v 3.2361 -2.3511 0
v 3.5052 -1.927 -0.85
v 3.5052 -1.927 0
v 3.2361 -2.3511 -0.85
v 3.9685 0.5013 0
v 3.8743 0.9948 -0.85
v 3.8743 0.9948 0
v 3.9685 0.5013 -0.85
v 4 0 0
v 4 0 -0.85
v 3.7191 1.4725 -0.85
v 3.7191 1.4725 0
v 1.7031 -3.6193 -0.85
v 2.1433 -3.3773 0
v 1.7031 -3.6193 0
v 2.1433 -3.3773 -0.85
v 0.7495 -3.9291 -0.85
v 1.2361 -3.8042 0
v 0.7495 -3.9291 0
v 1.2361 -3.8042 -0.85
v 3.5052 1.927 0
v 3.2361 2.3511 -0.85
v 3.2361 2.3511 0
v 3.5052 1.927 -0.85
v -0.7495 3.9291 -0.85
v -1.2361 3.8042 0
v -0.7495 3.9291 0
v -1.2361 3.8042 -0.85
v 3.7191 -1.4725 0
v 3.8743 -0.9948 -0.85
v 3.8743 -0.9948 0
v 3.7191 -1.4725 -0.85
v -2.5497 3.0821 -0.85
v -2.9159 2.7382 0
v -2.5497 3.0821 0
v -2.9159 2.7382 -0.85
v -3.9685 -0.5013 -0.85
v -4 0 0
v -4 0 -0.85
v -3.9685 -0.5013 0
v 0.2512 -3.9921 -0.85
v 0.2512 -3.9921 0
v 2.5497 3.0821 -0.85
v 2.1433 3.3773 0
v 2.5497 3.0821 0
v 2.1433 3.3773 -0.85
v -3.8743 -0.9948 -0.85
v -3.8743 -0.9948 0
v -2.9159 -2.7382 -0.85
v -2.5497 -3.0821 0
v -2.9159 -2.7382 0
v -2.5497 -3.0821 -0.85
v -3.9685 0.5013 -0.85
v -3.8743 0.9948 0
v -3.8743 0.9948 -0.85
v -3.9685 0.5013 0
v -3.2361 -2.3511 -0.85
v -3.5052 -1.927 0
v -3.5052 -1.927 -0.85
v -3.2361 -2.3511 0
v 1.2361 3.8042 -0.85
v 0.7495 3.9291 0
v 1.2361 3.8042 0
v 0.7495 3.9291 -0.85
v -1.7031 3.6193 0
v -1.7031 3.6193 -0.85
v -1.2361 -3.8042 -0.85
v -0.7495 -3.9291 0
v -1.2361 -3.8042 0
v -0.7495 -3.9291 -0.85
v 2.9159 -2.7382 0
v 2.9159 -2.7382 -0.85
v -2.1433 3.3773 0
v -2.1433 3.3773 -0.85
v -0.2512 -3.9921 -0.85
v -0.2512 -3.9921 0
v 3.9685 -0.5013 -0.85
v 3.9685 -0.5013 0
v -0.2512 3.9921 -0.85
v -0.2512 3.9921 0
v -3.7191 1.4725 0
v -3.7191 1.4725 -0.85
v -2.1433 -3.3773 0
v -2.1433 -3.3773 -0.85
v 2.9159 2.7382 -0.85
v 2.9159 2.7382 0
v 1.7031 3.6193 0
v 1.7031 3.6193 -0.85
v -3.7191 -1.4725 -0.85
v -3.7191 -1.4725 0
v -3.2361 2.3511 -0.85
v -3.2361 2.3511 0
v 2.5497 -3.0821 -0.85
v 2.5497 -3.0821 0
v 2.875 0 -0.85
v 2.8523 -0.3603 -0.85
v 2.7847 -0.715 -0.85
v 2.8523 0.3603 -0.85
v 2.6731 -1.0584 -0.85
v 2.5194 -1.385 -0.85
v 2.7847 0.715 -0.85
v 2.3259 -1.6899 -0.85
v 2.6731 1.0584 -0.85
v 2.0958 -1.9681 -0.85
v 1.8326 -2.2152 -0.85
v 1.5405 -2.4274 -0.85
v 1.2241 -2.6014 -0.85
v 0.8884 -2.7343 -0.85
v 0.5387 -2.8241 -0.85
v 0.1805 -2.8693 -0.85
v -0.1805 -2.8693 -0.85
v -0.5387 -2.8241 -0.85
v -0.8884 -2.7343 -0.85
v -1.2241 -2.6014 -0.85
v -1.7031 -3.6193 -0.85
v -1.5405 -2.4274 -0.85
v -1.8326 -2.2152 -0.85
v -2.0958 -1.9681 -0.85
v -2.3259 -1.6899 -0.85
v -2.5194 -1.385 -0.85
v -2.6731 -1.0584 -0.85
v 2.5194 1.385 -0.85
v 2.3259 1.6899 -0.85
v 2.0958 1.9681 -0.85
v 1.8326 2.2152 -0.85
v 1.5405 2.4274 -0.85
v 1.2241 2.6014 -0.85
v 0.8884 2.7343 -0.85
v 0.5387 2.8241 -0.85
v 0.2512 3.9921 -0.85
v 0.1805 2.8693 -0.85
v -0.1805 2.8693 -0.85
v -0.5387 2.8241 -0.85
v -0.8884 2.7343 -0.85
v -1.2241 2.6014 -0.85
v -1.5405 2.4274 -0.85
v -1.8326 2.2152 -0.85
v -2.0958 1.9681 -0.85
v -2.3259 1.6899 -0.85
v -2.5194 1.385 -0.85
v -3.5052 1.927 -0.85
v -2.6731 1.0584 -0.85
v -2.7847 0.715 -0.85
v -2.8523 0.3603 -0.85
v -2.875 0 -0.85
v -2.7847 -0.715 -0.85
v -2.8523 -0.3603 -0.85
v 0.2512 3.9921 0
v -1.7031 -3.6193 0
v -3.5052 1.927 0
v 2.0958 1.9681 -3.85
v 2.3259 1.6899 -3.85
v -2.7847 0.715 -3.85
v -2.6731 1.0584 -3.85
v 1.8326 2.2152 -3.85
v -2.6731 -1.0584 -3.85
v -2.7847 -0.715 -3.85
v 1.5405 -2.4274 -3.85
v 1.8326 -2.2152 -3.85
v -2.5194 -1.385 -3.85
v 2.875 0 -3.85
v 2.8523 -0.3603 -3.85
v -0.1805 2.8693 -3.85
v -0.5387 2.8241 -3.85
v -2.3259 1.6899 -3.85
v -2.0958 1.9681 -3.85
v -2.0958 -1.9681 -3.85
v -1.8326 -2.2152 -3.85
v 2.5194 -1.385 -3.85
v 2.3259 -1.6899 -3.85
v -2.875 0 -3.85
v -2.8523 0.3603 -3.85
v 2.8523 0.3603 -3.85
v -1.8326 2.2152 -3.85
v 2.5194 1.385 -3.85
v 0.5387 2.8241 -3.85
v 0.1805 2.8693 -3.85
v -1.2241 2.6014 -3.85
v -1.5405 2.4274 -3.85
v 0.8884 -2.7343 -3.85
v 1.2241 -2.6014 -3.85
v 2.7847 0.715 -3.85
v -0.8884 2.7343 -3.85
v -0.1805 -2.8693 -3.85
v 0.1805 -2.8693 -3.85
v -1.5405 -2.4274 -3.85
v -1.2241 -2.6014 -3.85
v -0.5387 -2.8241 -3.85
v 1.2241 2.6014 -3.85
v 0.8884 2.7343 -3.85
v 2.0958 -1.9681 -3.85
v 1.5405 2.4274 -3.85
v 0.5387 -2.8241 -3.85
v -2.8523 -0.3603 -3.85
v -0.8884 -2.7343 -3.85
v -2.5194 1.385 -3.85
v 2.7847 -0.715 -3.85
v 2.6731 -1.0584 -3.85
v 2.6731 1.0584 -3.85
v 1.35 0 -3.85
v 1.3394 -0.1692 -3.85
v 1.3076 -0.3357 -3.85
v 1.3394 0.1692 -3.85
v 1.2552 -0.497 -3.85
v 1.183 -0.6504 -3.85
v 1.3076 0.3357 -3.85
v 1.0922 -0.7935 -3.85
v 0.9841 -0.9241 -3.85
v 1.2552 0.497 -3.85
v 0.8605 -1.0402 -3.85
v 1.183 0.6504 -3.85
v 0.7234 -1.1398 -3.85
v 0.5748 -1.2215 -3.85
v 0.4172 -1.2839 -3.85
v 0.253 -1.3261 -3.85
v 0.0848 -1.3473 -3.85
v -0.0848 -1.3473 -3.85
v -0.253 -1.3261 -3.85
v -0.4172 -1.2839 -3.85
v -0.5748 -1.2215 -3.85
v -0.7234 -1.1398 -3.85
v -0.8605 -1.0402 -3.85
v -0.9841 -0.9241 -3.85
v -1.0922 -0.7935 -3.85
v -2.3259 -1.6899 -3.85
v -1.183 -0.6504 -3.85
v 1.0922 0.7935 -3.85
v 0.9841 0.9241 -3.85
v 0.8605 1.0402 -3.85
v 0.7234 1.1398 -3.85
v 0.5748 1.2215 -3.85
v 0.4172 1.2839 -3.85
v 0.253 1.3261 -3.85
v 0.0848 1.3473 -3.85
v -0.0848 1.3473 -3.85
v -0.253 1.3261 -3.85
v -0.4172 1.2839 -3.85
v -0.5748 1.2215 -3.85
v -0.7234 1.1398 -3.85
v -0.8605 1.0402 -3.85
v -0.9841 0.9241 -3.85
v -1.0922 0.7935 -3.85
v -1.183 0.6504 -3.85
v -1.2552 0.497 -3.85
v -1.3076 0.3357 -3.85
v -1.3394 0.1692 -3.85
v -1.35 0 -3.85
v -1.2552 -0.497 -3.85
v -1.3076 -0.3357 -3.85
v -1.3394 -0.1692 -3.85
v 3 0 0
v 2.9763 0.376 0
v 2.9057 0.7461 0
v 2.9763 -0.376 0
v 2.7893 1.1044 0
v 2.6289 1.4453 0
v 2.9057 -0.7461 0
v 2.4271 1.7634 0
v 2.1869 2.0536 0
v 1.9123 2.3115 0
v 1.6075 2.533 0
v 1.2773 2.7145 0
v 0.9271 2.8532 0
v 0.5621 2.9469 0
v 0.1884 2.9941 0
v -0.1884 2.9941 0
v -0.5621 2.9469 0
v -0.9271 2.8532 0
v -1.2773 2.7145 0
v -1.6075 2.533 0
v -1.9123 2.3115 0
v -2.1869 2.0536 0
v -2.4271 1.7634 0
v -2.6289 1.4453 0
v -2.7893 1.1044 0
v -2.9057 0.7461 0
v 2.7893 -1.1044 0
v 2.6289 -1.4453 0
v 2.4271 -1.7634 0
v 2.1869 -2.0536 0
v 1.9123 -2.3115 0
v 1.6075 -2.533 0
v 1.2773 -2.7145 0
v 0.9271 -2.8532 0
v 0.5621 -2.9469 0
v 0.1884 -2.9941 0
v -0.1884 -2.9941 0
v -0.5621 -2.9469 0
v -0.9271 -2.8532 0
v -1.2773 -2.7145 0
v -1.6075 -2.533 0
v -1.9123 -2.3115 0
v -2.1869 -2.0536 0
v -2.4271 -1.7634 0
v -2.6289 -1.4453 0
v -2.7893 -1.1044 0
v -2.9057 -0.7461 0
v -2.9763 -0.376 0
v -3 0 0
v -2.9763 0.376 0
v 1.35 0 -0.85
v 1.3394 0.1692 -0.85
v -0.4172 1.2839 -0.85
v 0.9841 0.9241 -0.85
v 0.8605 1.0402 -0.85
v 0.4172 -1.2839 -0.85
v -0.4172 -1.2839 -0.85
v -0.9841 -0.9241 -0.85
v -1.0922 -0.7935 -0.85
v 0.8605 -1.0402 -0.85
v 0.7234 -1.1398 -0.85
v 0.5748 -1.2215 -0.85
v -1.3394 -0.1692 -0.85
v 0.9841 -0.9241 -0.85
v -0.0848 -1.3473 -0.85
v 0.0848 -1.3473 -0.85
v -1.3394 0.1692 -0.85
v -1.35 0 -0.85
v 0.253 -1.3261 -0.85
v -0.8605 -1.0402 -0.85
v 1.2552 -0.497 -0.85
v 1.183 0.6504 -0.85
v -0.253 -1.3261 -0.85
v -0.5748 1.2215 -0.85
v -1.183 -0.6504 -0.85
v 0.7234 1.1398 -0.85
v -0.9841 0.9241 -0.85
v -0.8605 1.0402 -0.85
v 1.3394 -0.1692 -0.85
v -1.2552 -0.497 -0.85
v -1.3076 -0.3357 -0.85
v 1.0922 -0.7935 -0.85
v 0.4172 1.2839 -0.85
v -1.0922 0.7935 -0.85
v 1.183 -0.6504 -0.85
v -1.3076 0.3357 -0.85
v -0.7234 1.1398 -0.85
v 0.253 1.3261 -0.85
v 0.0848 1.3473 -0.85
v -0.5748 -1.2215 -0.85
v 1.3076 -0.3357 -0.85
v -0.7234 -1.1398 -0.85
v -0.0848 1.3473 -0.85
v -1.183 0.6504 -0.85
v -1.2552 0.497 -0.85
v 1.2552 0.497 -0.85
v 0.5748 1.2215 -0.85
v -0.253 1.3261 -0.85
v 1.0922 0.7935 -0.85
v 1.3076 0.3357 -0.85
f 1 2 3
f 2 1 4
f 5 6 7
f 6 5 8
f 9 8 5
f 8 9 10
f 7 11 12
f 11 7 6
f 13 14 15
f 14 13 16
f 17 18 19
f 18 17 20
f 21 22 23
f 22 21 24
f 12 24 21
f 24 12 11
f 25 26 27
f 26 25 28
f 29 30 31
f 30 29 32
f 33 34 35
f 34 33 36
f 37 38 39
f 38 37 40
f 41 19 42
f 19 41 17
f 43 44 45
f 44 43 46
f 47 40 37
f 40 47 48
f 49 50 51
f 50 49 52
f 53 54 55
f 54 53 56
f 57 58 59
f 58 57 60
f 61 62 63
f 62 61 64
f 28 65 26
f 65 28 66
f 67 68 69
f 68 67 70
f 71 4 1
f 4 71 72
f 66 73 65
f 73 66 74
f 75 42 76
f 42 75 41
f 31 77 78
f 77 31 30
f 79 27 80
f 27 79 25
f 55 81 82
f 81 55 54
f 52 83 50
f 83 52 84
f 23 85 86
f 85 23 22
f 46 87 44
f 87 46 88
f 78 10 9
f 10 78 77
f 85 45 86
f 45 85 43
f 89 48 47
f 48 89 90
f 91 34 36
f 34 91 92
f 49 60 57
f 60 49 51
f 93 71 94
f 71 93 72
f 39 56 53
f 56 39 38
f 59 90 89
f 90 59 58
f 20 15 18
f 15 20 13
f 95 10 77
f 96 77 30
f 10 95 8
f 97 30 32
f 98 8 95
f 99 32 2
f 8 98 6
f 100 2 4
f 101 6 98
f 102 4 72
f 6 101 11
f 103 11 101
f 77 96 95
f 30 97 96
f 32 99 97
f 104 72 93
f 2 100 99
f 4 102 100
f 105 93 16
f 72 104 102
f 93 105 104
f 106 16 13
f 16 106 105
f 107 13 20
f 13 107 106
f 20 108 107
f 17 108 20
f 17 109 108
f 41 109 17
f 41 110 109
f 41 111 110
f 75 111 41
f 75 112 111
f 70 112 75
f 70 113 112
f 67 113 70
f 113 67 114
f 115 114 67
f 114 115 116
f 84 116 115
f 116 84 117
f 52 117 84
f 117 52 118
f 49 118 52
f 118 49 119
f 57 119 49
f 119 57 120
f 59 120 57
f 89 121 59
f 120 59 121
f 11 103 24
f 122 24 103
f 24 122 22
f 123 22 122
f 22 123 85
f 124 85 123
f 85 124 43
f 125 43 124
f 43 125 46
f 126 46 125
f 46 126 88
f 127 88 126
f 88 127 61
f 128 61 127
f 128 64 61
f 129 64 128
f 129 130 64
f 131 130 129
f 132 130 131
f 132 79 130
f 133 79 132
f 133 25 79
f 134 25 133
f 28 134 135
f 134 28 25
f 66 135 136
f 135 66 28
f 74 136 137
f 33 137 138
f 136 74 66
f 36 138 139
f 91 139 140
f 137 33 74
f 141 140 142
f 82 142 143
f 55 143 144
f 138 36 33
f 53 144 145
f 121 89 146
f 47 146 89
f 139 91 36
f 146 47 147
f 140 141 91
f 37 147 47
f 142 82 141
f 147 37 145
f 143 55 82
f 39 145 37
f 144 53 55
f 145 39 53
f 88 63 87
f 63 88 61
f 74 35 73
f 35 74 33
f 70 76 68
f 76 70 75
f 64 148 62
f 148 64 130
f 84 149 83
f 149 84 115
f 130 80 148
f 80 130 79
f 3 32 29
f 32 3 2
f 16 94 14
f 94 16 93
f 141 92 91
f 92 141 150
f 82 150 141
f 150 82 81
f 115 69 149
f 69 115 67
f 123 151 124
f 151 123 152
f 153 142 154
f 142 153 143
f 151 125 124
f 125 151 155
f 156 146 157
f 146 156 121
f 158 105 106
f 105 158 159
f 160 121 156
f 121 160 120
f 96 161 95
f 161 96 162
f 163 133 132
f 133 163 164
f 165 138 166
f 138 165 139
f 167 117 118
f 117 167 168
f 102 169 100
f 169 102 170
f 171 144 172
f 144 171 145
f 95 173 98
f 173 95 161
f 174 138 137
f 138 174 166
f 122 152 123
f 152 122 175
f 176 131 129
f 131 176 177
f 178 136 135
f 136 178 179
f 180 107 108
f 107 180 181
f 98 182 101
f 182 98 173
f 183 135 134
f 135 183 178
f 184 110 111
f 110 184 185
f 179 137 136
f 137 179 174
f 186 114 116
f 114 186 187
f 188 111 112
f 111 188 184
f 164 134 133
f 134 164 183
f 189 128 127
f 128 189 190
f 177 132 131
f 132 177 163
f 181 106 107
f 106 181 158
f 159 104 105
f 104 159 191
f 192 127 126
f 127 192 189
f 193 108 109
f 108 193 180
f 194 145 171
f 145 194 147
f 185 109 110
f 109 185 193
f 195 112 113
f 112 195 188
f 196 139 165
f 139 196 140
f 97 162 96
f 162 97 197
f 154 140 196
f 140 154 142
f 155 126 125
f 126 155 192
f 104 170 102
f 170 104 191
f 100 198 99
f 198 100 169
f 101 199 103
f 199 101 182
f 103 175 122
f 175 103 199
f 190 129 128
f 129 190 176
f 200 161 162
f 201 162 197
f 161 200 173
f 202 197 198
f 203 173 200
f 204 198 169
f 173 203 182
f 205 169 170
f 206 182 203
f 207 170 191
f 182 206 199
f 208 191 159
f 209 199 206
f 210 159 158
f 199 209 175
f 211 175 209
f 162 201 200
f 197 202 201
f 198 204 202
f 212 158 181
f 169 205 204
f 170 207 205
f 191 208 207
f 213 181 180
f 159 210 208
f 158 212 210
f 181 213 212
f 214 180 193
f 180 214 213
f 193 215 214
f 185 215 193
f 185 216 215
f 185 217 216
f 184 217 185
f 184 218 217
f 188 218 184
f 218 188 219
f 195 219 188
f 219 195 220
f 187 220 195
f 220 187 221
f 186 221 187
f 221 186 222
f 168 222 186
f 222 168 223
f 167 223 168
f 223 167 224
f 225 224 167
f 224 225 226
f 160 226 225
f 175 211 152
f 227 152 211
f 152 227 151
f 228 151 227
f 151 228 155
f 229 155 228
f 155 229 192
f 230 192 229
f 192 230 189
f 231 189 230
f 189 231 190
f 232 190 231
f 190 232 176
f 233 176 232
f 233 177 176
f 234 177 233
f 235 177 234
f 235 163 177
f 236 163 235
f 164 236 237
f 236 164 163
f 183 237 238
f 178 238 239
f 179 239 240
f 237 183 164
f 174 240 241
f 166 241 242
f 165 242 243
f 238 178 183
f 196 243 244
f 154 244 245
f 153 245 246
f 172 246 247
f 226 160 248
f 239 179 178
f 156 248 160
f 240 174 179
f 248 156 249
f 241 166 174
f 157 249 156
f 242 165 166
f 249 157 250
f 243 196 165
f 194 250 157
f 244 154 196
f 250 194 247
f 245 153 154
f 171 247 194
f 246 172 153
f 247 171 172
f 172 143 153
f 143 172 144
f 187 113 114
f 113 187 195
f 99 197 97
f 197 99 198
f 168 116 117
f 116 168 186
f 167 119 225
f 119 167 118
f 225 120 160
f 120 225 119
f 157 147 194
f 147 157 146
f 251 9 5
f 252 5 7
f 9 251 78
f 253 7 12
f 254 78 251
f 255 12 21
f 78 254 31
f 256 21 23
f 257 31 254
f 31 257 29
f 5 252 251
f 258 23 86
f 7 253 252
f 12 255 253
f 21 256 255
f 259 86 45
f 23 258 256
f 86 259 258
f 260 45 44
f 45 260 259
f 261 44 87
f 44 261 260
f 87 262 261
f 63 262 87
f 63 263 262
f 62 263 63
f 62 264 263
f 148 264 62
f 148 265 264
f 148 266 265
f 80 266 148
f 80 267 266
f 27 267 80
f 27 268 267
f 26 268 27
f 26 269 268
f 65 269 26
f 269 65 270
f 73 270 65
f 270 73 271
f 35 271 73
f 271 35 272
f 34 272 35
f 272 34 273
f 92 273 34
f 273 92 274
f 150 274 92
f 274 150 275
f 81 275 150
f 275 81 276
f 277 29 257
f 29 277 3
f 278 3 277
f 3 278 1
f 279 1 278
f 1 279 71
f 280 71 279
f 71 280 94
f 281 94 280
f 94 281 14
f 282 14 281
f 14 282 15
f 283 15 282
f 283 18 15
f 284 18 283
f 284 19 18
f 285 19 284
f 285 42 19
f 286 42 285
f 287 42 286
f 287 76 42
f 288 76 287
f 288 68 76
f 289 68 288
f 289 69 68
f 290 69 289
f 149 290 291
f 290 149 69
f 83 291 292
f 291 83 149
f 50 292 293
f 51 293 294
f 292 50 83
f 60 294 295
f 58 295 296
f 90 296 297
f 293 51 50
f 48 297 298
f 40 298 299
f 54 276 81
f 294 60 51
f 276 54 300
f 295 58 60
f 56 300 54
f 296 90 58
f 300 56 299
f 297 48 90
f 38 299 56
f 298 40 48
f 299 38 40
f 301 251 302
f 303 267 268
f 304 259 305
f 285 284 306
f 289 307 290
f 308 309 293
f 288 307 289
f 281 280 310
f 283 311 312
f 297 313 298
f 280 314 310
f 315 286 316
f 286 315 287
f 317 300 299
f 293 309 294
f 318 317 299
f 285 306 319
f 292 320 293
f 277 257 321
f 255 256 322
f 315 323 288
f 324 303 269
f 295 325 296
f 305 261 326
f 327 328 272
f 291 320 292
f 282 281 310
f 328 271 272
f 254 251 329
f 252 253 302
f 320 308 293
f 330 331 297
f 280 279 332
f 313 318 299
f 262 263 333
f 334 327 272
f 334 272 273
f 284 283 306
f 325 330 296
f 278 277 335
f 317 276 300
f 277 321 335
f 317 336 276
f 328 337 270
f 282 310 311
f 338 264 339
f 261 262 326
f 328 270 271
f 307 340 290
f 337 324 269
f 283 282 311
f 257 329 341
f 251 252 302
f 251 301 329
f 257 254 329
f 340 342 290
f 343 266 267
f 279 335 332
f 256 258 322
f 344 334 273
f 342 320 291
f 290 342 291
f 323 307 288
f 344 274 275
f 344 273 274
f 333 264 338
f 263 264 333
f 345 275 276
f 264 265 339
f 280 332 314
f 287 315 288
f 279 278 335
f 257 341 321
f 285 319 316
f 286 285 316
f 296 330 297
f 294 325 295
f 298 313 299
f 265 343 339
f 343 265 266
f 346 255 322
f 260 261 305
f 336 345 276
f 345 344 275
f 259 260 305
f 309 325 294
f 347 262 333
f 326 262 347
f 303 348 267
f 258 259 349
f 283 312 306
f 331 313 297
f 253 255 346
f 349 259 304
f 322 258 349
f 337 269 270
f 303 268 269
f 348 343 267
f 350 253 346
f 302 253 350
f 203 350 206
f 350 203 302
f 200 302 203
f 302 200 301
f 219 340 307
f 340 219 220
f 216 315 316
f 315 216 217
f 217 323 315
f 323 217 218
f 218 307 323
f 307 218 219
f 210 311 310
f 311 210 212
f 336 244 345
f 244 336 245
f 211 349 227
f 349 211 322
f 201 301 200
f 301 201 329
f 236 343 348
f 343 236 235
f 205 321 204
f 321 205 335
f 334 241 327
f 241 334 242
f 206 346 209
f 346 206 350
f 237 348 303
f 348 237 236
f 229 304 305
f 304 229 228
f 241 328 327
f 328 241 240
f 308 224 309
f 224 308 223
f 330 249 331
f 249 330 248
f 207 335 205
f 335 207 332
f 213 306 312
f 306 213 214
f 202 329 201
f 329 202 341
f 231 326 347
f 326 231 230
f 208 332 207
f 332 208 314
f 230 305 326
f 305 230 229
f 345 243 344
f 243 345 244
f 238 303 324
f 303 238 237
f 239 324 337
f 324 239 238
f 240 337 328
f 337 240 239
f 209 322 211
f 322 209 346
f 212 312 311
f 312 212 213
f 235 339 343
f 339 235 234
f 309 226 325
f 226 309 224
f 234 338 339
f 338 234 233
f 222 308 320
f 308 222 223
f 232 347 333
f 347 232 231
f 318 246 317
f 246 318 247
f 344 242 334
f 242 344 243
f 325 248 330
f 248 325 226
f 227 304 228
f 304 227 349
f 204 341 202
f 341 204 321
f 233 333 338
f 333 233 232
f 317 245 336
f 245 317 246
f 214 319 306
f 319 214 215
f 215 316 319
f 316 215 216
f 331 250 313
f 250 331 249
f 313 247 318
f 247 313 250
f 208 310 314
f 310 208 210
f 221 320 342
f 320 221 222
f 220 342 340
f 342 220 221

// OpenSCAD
$fn = 50;

difference() {
	union() {
		translate(v = [0, 0, -0.8500000000000001]) {
			cylinder(h = 3.85, r = 4.0);
		}
		#translate(v = [0, 0, -3.85]) {
			cylinder(h = 3.85, r = 2.875);
		}
	}
	union() {
		translate(v = [0, 0, 0]) {
			rotate(a = [0, 0, 0]) {
				difference() {
					union() {
						translate(v = [0, 0, -3.85]) {
							cylinder(h = 3.85, r = 1.0);
						}
						translate(v = [0, 0, -0.85]) {
							cylinder(h = 0.85, r1 = 1.35, r2 = 3.0);
						}
						translate(v = [0, 0, -3.85]) {
							cylinder(h = 3.85, r = 1.35);
						}
						translate(v = [0, 0, -3.85]) {
							cylinder(h = 3.85, r = 1.0);
						}
					}
					union();
				}
			}
		}
		#cylinder(h = 3, r = 5.0);
	}
}
